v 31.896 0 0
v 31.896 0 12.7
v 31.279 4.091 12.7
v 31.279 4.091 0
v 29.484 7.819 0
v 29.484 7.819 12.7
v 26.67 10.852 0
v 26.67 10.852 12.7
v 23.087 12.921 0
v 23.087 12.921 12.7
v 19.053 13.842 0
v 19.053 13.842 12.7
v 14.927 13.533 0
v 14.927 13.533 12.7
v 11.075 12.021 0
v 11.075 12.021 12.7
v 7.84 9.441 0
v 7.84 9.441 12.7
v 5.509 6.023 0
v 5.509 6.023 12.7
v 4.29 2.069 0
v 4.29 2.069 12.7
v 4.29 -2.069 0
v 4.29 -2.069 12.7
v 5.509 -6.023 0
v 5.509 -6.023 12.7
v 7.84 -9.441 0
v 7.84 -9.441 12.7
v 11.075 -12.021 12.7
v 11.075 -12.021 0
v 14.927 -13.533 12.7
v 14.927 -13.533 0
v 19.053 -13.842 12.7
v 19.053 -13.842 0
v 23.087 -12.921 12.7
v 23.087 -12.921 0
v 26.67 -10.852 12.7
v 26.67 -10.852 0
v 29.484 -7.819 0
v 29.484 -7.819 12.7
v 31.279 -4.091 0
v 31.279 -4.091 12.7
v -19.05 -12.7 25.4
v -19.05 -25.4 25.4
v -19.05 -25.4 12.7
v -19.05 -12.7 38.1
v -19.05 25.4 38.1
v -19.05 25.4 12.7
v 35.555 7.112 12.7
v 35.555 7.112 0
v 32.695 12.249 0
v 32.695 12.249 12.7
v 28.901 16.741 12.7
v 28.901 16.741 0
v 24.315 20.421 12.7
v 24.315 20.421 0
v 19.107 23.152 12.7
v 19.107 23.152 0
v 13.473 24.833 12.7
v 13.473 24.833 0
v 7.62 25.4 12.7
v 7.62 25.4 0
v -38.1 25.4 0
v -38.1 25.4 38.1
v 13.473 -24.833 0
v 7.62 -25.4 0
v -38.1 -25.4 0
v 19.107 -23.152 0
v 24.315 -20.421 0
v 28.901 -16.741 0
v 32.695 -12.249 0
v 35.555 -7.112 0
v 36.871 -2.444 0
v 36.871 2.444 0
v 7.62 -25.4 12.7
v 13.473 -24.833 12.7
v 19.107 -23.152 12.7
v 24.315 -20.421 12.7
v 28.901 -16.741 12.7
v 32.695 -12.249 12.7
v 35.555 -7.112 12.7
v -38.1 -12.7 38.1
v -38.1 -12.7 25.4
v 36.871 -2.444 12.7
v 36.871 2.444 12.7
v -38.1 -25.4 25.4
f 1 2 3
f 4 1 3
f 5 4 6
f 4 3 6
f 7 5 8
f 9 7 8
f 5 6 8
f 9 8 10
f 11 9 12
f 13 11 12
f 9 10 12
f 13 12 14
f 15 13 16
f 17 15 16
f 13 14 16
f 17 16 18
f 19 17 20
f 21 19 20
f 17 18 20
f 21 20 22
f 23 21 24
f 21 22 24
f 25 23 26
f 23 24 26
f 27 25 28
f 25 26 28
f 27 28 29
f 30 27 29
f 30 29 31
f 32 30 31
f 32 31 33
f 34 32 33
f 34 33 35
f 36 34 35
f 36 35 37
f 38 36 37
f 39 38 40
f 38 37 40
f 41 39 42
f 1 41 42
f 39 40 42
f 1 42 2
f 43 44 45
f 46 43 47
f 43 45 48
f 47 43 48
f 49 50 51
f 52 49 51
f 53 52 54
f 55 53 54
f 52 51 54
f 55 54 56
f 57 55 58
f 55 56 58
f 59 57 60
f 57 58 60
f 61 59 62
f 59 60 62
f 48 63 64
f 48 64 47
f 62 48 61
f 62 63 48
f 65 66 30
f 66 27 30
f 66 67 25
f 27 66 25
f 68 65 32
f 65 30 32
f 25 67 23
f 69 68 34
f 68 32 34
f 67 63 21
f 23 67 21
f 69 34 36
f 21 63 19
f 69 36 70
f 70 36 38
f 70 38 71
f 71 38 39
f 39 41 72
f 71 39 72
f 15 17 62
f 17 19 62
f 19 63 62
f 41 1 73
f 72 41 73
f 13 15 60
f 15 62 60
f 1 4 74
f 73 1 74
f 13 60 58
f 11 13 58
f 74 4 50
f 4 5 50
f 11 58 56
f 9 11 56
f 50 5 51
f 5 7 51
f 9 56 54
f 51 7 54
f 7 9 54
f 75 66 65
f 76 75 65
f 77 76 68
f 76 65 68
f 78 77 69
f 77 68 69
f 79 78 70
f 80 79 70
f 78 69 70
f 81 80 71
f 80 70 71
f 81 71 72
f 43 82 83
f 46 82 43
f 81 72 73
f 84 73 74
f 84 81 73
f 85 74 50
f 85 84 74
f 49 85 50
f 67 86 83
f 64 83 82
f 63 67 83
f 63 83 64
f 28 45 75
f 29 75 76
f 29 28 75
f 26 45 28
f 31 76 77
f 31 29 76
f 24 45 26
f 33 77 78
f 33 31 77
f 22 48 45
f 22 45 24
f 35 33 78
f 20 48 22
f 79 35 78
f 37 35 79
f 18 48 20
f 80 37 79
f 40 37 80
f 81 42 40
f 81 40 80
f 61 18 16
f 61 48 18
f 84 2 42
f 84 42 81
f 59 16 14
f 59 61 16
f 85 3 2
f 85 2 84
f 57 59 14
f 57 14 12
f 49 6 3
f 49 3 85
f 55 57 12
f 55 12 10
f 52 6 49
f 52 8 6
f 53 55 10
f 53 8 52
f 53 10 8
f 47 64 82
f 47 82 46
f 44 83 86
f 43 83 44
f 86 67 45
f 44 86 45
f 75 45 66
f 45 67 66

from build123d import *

# Parameters (mm, degrees)
F1_DEPTH = 12.7
F2_W     = 19.05
F2_H     = 50.8
F3_DEPTH = 25.4
F4_W     = 19.05
F4_H     = 12.7
F5_DEPTH = 12.7
F6_R     = 13.8806094442
F7_DEPTH = 12.7
F8_R     = 17.78


with BuildPart() as f1:
    # F0 (on Top) → F1 (new body)
    with BuildSketch(Plane.XY):
        with BuildLine():
            ThreePointArc((37.6736852981, 0), (27.2947553987, 18.1994845304), (7.62, 25.4))
            Line((7.62, 25.4), (-38.1, 25.4))
            Line((-38.1, 25.4), (-38.1, -25.4))
            Line((-38.1, -25.4), (7.62, -25.4))
            ThreePointArc((7.62, -25.4), (27.2947553987, -18.1994845304), (37.6736852981, 0))
        make_face()
    extrude(amount=F1_DEPTH)

    # F2 (on face) → F3 (join)
    with BuildSketch(Plane.XY.offset(12.7)):
        with Locations((-28.575, 0)):
            Rectangle(F2_W, F2_H)
    extrude(amount=F3_DEPTH)

    # F4 (on face) → F5 (cut)
    with BuildSketch(Plane.XY.offset(38.1)):
        with Locations((-28.575, -19.05)):
            Rectangle(F4_W, F4_H)
    extrude(amount=-F5_DEPTH, mode=Mode.SUBTRACT)

    # F6 (on face) → F7 (cut)
    with BuildSketch(Plane.XY.offset(12.7)):
        with Locations((18.0154964328, 0)):
            Circle(F6_R)
    extrude(amount=-F7_DEPTH, mode=Mode.SUBTRACT)

    # F8
    f8_edges = [f1.edges().sort_by_distance(p)[0] for p in [
        (37.673685, 0, 6.35),
    ]]
    fillet(f8_edges, radius=F8_R)


solid = f1.part
